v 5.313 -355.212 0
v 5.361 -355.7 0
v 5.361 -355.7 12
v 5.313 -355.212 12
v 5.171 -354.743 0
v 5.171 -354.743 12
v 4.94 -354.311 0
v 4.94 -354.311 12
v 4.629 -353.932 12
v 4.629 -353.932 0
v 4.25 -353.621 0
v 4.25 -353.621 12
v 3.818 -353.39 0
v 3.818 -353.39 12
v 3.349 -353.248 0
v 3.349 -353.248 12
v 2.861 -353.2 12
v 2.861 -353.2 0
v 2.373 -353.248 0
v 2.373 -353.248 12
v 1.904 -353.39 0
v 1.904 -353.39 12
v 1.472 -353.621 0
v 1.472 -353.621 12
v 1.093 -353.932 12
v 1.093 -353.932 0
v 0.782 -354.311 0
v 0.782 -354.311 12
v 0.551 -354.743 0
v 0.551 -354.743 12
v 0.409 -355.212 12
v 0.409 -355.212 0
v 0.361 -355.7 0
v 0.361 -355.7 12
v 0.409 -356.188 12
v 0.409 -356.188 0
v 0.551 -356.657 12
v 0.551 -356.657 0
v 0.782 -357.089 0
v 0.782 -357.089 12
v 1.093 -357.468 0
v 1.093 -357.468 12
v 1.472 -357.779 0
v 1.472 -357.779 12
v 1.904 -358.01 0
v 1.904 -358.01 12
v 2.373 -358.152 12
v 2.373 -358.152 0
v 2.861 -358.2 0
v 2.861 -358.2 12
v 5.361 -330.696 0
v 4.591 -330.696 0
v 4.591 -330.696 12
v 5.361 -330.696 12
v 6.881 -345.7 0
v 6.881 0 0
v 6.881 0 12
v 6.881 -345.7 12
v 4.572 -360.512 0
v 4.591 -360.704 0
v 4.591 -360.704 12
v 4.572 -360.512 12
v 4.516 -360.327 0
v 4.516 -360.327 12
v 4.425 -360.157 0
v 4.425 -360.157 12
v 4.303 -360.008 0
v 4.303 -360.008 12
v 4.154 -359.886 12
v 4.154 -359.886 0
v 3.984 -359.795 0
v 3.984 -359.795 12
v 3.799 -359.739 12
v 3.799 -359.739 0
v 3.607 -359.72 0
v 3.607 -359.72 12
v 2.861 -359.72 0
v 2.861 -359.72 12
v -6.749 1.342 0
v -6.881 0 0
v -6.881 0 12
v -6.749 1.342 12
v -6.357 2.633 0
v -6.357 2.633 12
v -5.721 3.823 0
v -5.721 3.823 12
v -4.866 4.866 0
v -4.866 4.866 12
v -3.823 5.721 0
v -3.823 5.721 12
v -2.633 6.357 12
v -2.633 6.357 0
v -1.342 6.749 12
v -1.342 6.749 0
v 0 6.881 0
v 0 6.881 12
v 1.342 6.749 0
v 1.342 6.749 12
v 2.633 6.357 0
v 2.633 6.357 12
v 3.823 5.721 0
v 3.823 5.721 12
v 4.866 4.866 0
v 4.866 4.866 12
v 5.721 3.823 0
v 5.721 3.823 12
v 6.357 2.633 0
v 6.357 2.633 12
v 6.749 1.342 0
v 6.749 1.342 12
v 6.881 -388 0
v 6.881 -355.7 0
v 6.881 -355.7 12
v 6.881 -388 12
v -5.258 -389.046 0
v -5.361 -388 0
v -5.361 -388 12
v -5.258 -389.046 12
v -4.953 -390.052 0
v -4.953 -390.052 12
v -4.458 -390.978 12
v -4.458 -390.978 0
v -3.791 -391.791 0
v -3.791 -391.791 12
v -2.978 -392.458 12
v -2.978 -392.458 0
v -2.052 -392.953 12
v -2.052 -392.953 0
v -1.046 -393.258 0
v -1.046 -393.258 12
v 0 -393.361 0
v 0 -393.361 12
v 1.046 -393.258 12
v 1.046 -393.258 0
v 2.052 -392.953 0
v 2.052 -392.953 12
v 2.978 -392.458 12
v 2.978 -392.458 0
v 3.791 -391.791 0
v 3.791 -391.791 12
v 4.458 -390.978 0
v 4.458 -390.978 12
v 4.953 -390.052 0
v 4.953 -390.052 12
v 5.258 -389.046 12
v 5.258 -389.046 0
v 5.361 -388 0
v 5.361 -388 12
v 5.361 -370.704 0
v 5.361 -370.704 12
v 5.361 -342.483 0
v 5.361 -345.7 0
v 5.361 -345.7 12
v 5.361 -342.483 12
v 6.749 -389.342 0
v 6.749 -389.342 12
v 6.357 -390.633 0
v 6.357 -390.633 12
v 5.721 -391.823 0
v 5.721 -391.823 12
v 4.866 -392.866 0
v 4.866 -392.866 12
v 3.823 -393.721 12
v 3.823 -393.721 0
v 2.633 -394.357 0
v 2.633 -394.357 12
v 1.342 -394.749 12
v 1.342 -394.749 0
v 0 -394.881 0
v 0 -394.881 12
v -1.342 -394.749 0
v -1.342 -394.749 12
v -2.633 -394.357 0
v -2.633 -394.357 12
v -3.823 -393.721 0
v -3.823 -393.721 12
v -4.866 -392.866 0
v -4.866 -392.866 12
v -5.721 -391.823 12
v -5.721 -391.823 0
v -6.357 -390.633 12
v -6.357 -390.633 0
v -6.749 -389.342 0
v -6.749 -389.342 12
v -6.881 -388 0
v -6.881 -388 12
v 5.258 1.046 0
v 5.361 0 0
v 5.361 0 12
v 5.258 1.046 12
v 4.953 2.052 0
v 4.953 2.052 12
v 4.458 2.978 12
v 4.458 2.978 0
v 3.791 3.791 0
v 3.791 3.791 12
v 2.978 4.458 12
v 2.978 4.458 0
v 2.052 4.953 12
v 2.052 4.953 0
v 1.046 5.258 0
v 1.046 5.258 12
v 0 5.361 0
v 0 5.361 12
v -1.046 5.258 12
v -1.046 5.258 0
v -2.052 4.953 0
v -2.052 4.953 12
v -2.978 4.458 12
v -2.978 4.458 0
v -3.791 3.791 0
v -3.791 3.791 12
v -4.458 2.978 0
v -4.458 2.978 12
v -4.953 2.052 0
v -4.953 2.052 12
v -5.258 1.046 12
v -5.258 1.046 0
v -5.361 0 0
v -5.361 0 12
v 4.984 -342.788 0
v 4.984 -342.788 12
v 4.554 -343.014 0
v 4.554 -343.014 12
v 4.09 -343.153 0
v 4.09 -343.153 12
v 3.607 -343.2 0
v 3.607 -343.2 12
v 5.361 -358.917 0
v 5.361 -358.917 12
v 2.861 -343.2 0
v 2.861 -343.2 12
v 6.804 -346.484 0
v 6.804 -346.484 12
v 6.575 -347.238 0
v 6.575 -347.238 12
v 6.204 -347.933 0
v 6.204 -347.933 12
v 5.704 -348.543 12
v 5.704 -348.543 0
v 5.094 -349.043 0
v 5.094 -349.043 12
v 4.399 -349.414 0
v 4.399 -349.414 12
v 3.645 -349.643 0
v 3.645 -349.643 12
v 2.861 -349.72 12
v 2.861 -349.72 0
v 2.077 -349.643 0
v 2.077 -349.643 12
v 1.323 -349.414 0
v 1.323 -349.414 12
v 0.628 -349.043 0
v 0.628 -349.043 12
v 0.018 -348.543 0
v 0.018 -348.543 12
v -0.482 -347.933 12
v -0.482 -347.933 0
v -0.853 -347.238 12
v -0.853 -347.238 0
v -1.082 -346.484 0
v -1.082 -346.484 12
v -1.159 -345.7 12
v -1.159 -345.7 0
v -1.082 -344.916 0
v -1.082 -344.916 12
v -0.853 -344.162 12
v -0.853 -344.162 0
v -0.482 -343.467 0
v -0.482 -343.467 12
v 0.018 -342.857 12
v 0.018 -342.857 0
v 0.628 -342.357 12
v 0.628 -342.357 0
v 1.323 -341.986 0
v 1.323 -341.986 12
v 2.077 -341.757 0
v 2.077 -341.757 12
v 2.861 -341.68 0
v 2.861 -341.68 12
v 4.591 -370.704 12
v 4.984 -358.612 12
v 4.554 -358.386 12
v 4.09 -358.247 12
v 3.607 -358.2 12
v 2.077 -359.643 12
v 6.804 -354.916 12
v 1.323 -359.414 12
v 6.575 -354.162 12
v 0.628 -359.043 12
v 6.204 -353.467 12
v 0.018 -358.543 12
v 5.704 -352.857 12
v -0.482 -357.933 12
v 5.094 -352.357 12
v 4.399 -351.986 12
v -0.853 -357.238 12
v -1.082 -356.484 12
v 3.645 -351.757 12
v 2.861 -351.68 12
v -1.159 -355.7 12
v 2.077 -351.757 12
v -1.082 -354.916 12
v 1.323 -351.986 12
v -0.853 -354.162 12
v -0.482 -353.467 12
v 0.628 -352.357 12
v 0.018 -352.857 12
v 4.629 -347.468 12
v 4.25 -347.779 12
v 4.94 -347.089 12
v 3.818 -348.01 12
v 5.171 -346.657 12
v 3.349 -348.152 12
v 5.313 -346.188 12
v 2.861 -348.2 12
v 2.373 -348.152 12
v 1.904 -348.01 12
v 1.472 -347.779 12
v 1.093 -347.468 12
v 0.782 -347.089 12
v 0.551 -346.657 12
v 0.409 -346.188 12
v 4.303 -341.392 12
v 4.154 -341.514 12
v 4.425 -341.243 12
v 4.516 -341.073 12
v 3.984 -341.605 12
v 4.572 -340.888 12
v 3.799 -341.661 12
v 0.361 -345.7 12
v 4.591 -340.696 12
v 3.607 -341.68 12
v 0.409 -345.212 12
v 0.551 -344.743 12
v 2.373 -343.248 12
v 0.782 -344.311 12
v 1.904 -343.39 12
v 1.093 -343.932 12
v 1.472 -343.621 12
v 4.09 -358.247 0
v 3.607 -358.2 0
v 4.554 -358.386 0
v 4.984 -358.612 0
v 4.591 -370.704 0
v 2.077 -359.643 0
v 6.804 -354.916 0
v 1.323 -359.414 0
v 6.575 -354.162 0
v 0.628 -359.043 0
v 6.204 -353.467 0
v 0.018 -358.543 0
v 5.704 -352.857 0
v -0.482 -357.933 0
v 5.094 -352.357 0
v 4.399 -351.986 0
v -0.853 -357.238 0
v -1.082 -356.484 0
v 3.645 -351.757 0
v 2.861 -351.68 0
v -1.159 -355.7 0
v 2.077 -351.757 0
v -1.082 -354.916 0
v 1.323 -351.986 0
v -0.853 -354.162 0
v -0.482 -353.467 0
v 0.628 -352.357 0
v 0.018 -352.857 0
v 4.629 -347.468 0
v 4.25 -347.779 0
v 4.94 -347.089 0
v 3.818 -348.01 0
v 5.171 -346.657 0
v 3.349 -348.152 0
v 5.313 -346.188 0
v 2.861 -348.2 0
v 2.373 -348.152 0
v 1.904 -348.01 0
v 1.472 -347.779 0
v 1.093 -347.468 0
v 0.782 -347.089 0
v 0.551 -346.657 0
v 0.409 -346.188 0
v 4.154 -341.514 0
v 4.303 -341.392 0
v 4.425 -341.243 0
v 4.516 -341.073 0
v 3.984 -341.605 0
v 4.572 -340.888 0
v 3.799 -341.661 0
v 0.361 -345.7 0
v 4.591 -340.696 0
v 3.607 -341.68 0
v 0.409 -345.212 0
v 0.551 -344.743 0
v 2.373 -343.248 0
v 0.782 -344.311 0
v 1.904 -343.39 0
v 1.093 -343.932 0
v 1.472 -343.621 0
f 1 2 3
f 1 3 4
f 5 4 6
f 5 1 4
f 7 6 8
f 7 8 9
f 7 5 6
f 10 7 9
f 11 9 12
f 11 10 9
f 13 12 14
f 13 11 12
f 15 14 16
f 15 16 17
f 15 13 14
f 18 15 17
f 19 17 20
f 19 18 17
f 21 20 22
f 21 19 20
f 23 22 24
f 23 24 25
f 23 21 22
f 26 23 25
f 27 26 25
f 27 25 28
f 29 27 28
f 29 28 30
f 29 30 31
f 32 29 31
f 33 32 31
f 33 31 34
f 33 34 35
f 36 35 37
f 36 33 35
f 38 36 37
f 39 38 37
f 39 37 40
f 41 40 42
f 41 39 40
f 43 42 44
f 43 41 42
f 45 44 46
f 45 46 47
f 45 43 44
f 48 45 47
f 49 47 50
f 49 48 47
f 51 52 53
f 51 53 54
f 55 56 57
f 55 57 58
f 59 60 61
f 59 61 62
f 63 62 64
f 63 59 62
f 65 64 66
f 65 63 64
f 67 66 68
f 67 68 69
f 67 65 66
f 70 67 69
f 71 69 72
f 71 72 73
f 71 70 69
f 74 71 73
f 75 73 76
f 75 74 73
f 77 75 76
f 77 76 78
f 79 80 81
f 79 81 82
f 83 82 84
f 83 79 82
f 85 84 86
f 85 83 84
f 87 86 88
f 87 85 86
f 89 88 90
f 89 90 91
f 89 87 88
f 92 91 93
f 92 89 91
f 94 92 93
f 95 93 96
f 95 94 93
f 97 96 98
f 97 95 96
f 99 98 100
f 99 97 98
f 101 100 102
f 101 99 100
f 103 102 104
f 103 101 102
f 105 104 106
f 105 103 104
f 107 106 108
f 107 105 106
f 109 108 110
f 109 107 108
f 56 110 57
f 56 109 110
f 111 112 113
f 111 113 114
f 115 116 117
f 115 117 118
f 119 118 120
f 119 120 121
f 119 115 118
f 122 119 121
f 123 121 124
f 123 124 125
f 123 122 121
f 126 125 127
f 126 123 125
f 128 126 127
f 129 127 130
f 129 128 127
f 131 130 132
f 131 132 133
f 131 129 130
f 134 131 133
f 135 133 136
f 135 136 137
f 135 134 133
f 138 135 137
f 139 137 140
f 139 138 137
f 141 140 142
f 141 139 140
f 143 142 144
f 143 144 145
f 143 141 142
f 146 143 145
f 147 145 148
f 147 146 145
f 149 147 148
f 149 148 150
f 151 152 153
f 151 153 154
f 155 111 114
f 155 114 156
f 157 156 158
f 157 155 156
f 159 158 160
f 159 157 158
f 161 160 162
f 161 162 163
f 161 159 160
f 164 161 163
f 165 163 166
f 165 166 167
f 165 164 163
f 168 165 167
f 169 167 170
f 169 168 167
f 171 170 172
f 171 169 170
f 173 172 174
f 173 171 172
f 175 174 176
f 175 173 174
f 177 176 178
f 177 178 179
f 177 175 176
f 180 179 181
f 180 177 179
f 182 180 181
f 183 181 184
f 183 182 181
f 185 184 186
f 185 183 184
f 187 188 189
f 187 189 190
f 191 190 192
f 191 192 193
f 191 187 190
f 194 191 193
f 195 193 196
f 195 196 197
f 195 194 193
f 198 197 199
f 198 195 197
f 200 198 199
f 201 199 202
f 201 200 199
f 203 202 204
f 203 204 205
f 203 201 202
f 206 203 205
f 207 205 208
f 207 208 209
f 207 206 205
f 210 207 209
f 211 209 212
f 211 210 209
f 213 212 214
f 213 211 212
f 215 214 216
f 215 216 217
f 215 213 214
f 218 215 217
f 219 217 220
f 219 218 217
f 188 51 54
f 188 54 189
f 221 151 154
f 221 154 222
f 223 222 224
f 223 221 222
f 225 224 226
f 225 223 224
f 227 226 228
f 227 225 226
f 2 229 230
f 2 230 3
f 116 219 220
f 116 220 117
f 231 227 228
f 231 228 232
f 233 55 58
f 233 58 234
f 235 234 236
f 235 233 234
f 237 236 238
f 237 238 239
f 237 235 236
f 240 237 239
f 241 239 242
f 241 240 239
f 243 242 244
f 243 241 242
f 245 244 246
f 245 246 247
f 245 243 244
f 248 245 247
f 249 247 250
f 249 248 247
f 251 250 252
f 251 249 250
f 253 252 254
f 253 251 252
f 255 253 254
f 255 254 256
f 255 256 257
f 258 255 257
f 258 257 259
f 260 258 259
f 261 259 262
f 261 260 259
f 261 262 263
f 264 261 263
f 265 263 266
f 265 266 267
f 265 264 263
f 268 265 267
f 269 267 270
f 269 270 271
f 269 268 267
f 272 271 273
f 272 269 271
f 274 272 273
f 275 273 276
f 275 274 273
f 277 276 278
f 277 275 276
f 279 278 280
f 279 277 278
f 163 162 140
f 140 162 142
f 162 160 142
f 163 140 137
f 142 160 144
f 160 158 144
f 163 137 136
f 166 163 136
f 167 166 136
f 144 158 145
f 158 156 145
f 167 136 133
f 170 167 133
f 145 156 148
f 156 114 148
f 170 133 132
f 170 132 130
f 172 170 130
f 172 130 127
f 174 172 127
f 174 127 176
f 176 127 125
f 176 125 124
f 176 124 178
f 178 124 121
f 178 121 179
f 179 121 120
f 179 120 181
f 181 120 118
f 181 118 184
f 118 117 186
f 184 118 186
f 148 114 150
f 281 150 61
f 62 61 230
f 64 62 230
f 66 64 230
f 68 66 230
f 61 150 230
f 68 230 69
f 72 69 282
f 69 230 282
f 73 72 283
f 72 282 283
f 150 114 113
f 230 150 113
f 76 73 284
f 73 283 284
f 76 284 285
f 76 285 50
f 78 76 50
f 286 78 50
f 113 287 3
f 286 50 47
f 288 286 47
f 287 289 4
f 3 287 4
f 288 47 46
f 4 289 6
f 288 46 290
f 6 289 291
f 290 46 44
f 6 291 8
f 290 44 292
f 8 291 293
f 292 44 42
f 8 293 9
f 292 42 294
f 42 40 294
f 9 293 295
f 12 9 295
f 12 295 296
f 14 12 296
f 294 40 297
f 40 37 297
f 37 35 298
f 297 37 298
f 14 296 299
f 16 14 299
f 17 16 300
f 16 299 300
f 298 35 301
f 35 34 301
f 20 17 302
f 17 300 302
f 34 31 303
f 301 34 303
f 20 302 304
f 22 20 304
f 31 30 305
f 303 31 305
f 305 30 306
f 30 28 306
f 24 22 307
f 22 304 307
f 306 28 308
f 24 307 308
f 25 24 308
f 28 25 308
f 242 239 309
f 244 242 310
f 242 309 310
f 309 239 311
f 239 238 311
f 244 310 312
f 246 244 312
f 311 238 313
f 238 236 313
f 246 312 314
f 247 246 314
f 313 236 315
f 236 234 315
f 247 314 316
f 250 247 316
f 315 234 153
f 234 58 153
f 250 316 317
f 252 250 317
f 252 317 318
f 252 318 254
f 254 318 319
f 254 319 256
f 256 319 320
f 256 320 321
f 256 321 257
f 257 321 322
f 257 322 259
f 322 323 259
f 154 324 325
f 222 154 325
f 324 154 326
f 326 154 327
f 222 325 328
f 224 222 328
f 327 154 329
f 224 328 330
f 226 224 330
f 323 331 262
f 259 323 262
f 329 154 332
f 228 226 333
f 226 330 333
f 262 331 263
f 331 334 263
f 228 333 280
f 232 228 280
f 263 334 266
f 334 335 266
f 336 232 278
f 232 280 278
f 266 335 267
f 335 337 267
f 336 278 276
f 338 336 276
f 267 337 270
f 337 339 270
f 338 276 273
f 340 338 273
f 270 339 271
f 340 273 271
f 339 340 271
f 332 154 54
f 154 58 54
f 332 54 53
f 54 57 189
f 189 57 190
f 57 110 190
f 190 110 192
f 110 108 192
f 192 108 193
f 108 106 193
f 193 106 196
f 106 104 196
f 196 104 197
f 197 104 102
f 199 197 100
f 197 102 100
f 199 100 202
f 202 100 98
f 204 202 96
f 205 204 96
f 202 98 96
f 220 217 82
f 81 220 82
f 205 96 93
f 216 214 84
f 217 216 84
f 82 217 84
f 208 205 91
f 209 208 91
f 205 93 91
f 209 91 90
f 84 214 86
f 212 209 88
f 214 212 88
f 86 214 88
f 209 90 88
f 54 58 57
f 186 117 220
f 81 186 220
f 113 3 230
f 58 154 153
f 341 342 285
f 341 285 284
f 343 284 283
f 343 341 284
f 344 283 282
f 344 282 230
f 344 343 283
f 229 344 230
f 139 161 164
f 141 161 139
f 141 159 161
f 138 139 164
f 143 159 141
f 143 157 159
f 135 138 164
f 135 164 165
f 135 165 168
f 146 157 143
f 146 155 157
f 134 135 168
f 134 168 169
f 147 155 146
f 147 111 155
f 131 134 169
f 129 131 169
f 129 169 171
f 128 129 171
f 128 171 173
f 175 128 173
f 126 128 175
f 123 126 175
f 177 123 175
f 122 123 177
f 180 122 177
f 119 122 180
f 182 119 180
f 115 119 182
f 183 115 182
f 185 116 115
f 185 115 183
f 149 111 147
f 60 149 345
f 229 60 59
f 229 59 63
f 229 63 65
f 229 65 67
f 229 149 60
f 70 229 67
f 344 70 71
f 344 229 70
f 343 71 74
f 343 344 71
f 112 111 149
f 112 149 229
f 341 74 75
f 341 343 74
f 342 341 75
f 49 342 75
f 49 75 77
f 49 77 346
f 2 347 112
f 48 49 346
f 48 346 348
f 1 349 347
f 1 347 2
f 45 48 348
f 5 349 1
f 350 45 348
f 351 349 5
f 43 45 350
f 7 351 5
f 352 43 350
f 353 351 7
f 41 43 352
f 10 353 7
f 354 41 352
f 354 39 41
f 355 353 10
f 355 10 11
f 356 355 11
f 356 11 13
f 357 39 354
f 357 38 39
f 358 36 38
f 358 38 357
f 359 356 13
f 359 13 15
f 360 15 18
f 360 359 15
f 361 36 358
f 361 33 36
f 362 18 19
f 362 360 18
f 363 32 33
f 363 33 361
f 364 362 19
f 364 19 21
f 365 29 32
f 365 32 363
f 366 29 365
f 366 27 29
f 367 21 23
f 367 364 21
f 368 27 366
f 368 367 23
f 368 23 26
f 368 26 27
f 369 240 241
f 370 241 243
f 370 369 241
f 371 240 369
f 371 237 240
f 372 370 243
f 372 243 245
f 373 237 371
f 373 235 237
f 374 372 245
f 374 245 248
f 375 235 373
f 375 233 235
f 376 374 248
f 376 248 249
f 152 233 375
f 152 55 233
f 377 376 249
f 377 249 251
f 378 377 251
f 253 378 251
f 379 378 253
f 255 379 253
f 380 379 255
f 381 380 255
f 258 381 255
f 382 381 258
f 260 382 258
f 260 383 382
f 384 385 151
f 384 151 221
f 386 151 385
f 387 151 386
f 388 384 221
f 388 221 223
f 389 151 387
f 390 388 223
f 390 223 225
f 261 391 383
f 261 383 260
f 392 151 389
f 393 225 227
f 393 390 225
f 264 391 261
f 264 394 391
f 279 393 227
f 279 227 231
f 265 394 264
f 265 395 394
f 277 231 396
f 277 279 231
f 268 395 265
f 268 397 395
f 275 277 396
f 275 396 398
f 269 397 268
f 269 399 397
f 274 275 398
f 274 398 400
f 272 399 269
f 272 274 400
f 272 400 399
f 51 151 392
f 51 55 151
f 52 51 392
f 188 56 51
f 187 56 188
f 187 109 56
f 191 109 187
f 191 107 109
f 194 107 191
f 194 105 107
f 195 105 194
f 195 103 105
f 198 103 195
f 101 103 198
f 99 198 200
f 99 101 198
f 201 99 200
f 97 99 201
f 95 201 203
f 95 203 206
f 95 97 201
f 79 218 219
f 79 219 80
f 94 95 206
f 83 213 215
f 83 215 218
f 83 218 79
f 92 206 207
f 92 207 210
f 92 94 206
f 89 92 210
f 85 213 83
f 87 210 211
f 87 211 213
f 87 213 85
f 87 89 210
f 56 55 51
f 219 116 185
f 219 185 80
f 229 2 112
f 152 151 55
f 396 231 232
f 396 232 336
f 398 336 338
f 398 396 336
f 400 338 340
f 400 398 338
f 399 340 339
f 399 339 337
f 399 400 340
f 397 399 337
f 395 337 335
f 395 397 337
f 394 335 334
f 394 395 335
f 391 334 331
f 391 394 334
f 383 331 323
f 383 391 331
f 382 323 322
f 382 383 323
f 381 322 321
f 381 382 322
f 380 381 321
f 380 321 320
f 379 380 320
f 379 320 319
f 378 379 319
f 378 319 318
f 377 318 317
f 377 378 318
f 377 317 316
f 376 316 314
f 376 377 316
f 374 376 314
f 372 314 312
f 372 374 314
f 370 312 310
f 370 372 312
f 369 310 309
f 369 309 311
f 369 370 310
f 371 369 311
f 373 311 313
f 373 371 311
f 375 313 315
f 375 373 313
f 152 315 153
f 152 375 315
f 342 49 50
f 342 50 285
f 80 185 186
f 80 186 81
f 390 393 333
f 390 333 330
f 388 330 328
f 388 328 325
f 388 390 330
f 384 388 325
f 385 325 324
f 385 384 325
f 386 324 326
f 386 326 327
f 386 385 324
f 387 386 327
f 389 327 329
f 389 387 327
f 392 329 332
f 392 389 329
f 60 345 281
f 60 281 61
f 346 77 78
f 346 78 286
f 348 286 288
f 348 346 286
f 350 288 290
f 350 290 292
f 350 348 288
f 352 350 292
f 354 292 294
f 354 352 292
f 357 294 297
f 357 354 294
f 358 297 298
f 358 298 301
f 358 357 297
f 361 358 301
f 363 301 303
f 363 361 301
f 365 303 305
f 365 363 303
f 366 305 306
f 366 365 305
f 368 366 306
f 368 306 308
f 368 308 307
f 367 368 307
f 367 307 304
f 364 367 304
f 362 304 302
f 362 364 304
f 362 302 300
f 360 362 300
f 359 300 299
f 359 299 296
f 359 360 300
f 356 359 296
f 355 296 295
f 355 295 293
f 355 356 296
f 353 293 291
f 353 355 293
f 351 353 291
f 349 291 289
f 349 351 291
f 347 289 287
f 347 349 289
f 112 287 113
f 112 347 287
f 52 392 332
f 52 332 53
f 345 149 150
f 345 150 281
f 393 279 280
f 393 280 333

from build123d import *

# Parameters (mm, degrees)
EXTRUDE_THIN1_DEPTH = 12
BOSS_EXTRUDE2_START = -12
BOSS_EXTRUDE2_DEPTH = 12


with BuildPart() as part:
    # Sketch1 → Extrude-Thin1 (new body)
    with BuildSketch(Plane.XY):
        with BuildLine():
            Line((5.107, -330.696), (5.107, -340.696))
            ThreePointArc((5.107, -340.696), (4.667660172, -341.756660172), (3.607, -342.196))
            Line((3.607, -342.196), (2.861, -342.196))
            ThreePointArc((2.861, -342.196), (0.383297839, -348.177702161), (6.365, -345.7))
            Line((6.365, -345.7), (6.365, 0))
            ThreePointArc((6.365, 0), (0, 6.365), (-6.365, 0))
            Line((-6.365, 0), (-6.365, -388))
            ThreePointArc((-6.365, -388), (0, -394.365), (6.365, -388))
            Line((6.365, -388), (6.365, -355.7))
            ThreePointArc((6.365, -355.7), (0.383297839, -353.222297839), (2.861, -359.204))
            Line((2.861, -359.204), (3.607, -359.204))
            ThreePointArc((3.607, -359.204), (4.667660172, -359.643339828), (5.107, -360.704))
            Line((5.107, -360.704), (5.107, -370.704))
            Line((5.107, -370.704), (4.591, -370.704))
            Line((4.591, -370.704), (4.591, -360.704))
            ThreePointArc((4.591, -360.704), (4.302793073, -360.008206927), (3.607, -359.72))
            Line((3.607, -359.72), (2.861, -359.72))
            ThreePointArc((2.861, -359.72), (0.01843074, -352.85743074), (6.881, -355.7))
            Line((6.881, -355.7), (6.881, -388))
            ThreePointArc((6.881, -388), (0, -394.881), (-6.881, -388))
            Line((-6.881, -388), (-6.881, 0))
            ThreePointArc((-6.881, 0), (0, 6.881), (6.881, 0))
            Line((6.881, 0), (6.881, -345.7))
            ThreePointArc((6.881, -345.7), (0.01843074, -348.54256926), (2.861, -341.68))
            Line((2.861, -341.68), (3.607, -341.68))
            ThreePointArc((3.607, -341.68), (4.302793073, -341.391793073), (4.591, -340.696))
            Line((4.591, -340.696), (4.591, -330.696))
            Line((4.591, -330.696), (5.107, -330.696))
        make_face()
    extrude(amount=EXTRUDE_THIN1_DEPTH)

    # Sketch3 → Boss-Extrude2 (add)
    with BuildSketch(Plane.XY.offset(12).offset(BOSS_EXTRUDE2_START)):
        with BuildLine():
            ThreePointArc((-5.361, -388), (0, -393.361), (5.361, -388))
            Line((5.361, -388), (5.361, -370.704))
            Line((5.361, -370.704), (5.107, -370.704))
            Line((5.107, -370.704), (5.107, -360.704))
            ThreePointArc((5.107, -360.704), (4.667660172, -359.643339828), (3.607, -359.204))
            Line((3.607, -359.204), (2.861, -359.204))
            ThreePointArc((2.861, -359.204), (0.383297839, -353.222297839), (6.365, -355.7))
            Line((6.365, -355.7), (6.365, -388))
            ThreePointArc((6.365, -388), (0, -394.365), (-6.365, -388))
            Line((-6.365, -388), (-6.365, 0))
            ThreePointArc((-6.365, 0), (0, 6.365), (6.365, 0))
            Line((6.365, 0), (6.365, -345.7))
            ThreePointArc((6.365, -345.7), (0.383297839, -348.177702161), (2.861, -342.196))
            Line((2.861, -342.196), (3.607, -342.196))
            ThreePointArc((3.607, -342.196), (4.667660172, -341.756660172), (5.107, -340.696))
            Line((5.107, -340.696), (5.107, -330.696))
            Line((5.107, -330.696), (5.361, -330.696))
            Line((5.361, -330.696), (5.361, 0))
            ThreePointArc((5.361, 0), (0, 5.361), (-5.361, 0))
            Line((-5.361, 0), (-5.361, -388))
        make_face()
        with BuildLine():
            ThreePointArc((5.361, -355.7), (1.093233047, -353.932233047), (2.861, -358.2))
            Line((2.861, -358.2), (3.607, -358.2))
            ThreePointArc((3.607, -358.2), (4.554437655, -358.386160944), (5.361, -358.916963347))
            Line((5.361, -358.916963347), (5.361, -355.7))
        make_face(mode=Mode.SUBTRACT)
        with BuildLine():
            ThreePointArc((2.861, -343.2), (1.093233047, -347.467766953), (5.361, -345.7))
            Line((5.361, -345.7), (5.361, -342.483036653))
            ThreePointArc((5.361, -342.483036653), (4.554437655, -343.013839056), (3.607, -343.2))
            Line((3.607, -343.2), (2.861, -343.2))
        make_face(mode=Mode.SUBTRACT)
    extrude(amount=BOSS_EXTRUDE2_DEPTH)


solid = part.part
